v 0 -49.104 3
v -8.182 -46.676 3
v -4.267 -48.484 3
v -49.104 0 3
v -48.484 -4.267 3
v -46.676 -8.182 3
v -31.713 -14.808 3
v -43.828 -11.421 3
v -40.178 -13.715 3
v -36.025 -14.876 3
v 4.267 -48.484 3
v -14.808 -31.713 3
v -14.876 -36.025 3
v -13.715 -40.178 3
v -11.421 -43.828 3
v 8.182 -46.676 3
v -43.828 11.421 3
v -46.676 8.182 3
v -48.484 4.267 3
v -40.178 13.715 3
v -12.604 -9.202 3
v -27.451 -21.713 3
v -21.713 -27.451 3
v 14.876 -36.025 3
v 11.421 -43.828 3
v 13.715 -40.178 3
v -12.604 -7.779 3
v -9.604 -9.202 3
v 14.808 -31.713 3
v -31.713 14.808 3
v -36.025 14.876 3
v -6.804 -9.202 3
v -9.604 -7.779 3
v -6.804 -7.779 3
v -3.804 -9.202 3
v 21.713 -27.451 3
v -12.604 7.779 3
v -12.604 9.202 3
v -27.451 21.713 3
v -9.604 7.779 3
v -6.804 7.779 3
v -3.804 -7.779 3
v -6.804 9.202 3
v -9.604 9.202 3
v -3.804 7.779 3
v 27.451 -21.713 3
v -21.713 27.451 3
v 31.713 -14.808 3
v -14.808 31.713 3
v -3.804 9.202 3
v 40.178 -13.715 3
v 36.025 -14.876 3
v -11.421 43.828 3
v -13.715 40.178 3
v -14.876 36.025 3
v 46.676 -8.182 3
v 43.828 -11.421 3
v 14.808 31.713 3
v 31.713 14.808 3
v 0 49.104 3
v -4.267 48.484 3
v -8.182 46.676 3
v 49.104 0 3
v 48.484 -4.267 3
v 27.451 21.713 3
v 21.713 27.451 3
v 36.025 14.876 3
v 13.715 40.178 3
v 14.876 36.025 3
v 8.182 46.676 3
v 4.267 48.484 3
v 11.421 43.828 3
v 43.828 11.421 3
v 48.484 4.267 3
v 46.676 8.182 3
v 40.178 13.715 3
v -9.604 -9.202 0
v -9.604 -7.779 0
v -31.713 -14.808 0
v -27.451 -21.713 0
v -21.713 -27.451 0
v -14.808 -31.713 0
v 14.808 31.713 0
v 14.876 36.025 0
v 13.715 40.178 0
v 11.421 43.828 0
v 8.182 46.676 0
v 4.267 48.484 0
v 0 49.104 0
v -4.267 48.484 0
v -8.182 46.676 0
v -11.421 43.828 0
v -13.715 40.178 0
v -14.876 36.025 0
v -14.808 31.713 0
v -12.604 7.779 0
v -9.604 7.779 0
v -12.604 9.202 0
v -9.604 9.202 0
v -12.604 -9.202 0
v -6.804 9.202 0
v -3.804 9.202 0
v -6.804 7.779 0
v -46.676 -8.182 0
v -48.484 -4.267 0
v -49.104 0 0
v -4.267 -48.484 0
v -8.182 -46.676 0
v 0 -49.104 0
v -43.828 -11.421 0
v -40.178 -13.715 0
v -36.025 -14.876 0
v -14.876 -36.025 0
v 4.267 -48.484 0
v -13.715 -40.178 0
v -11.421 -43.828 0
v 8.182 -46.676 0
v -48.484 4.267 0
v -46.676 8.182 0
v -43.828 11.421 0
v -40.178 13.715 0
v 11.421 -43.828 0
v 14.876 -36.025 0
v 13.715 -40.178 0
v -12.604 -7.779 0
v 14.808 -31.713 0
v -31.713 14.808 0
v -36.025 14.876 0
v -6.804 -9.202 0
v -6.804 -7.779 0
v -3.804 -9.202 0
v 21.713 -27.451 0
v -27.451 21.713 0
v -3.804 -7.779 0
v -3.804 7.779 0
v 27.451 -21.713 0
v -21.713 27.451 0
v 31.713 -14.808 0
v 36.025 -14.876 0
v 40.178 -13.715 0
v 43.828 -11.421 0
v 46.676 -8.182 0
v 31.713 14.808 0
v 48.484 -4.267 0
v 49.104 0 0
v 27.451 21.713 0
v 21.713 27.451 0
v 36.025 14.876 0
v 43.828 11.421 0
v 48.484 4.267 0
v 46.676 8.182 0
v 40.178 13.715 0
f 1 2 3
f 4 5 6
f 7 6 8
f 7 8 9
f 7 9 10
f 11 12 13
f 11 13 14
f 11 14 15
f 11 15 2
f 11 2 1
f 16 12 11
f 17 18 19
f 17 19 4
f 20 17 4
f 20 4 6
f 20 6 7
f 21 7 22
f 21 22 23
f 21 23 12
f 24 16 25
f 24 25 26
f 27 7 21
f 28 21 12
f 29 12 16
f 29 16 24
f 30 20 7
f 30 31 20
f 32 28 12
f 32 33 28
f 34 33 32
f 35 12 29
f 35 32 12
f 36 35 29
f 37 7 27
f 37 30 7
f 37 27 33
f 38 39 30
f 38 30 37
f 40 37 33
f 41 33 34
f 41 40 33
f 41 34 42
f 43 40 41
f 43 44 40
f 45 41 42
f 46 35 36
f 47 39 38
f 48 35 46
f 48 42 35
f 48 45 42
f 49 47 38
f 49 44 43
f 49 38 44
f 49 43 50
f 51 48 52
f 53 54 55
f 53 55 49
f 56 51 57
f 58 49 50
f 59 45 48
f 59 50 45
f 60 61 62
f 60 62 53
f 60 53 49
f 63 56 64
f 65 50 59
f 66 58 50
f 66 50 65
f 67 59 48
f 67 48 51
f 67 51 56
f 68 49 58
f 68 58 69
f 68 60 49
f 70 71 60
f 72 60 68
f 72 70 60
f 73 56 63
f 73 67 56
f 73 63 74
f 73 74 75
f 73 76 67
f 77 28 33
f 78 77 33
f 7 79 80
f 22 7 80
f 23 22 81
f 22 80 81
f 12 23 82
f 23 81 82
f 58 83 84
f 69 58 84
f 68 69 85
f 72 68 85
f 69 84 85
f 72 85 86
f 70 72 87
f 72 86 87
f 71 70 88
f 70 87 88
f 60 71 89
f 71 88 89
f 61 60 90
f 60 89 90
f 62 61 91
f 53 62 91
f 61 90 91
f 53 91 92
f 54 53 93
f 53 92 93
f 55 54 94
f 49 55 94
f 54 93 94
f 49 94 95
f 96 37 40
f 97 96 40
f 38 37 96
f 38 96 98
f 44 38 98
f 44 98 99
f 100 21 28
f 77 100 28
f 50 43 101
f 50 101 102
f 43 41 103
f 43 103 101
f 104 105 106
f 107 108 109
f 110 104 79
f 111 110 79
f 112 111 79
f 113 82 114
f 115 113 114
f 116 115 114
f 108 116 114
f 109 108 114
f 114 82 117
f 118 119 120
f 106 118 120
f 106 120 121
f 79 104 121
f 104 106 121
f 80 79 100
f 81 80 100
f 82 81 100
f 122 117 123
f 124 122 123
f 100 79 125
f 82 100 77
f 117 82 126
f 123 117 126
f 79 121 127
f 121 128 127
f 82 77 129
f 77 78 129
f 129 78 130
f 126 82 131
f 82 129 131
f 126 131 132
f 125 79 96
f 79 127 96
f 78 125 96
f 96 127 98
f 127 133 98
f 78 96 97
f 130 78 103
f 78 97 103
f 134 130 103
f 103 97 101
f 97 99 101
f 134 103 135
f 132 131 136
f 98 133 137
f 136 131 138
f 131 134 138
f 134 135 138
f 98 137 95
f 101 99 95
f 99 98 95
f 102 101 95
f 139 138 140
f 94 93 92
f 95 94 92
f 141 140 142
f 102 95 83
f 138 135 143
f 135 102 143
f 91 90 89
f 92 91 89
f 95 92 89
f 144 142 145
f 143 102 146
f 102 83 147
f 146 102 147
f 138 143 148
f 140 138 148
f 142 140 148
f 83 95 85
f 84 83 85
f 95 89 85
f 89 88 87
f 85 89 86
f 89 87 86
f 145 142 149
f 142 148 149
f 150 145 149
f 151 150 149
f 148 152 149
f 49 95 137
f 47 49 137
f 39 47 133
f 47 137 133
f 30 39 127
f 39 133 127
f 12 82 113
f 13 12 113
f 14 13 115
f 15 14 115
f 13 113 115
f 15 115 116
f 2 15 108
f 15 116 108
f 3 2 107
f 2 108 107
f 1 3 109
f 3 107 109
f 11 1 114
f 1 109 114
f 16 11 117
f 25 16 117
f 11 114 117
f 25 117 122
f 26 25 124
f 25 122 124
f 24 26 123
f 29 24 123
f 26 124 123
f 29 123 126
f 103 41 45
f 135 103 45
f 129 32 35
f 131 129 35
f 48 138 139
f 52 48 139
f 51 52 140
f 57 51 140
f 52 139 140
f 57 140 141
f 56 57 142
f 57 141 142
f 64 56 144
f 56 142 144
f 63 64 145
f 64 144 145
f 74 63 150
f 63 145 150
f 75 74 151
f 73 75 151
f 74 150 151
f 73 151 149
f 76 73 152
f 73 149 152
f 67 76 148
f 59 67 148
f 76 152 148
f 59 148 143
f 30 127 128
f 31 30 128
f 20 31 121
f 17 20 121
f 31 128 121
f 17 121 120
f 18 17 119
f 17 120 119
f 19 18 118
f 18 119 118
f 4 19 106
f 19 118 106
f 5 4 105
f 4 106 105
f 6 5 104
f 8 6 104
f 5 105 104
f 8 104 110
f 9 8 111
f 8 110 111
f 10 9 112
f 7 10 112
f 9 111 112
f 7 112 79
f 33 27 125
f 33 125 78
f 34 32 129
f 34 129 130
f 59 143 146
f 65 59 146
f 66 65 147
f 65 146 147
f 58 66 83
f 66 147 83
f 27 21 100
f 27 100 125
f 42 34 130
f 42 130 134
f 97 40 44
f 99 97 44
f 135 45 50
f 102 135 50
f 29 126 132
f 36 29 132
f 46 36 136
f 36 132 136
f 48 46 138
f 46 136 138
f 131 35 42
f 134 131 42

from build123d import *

# Parameters (mm, degrees)
SALIENTE_EXTRUIR1_DEPTH = 3
CORTAR_EXTRUIR1_REACH   = 71.508
CROQUIS4_W              = 3
CROQUIS4_H              = 1.42248357


with BuildPart() as part:
    # Croquis1 → Saliente-Extruir1 (new body)
    with BuildSketch(Plane.XY):
        with BuildLine():
            ThreePointArc((-31.713020554, -14.808252002), (-24.748737342, -24.748737342), (-14.808252002, -31.713020554))
            ThreePointArc((-14.808252002, -31.713020554), (0, -49.10376785), (14.808252002, -31.713020554))
            ThreePointArc((14.808252002, -31.713020554), (24.748737342, -24.748737342), (31.713020554, -14.808252002))
            ThreePointArc((31.713020554, -14.808252002), (49.10376785, 0), (31.713020554, 14.808252002))
            ThreePointArc((31.713020554, 14.808252002), (24.748737342, 24.748737342), (14.808252002, 31.713020554))
            ThreePointArc((14.808252002, 31.713020554), (0, 49.10376785), (-14.808252002, 31.713020554))
            ThreePointArc((-14.808252002, 31.713020554), (-24.748737342, 24.748737342), (-31.713020554, 14.808252002))
            ThreePointArc((-31.713020554, 14.808252002), (-49.10376785, 0), (-31.713020554, -14.808252002))
        make_face()
    extrude(amount=SALIENTE_EXTRUIR1_DEPTH)

    # Croquis4 → Cortar-Extruir1 (cut, up to next)
    with BuildSketch(Plane.XY.offset(3), mode=Mode.PRIVATE) as cortar_extruir1_sk1:
        with Locations((-5.30376785, -8.49072148)):
            Rectangle(CROQUIS4_W, CROQUIS4_H)
    cortar_extruir1_tool1 = extrude(cortar_extruir1_sk1.sketch, amount=-CORTAR_EXTRUIR1_REACH, mode=Mode.PRIVATE) & part.part
    # Croquis4 → Cortar-Extruir1 (cut, up to next)
    with BuildSketch(Plane.XY.offset(3), mode=Mode.PRIVATE) as cortar_extruir1_sk2:
        with Locations((-5.30376785, 8.49072148)):
            Rectangle(CROQUIS4_W, CROQUIS4_H)
    cortar_extruir1_tool2 = extrude(cortar_extruir1_sk2.sketch, amount=-CORTAR_EXTRUIR1_REACH, mode=Mode.PRIVATE) & part.part
    # Croquis4 → Cortar-Extruir1 (cut, up to next)
    with BuildSketch(Plane.XY.offset(3), mode=Mode.PRIVATE) as cortar_extruir1_sk3:
        with Locations((-11.10376785, 8.49072148)):
            Rectangle(CROQUIS4_W, CROQUIS4_H)
    cortar_extruir1_tool3 = extrude(cortar_extruir1_sk3.sketch, amount=-CORTAR_EXTRUIR1_REACH, mode=Mode.PRIVATE) & part.part
    # Croquis4 → Cortar-Extruir1 (cut, up to next)
    with BuildSketch(Plane.XY.offset(3), mode=Mode.PRIVATE) as cortar_extruir1_sk4:
        with Locations((-11.10376785, -8.49072148)):
            Rectangle(CROQUIS4_W, CROQUIS4_H)
    cortar_extruir1_tool4 = extrude(cortar_extruir1_sk4.sketch, amount=-CORTAR_EXTRUIR1_REACH, mode=Mode.PRIVATE) & part.part
    add(cortar_extruir1_tool1.solids().sort_by_distance((-5.303768, -8.490721, 3))[0], mode=Mode.SUBTRACT)
    add(cortar_extruir1_tool2.solids().sort_by_distance((-5.303768, 8.490721, 3))[0], mode=Mode.SUBTRACT)
    add(cortar_extruir1_tool3.solids().sort_by_distance((-11.103768, 8.490721, 3))[0], mode=Mode.SUBTRACT)
    add(cortar_extruir1_tool4.solids().sort_by_distance((-11.103768, -8.490721, 3))[0], mode=Mode.SUBTRACT)


solid = part.part
